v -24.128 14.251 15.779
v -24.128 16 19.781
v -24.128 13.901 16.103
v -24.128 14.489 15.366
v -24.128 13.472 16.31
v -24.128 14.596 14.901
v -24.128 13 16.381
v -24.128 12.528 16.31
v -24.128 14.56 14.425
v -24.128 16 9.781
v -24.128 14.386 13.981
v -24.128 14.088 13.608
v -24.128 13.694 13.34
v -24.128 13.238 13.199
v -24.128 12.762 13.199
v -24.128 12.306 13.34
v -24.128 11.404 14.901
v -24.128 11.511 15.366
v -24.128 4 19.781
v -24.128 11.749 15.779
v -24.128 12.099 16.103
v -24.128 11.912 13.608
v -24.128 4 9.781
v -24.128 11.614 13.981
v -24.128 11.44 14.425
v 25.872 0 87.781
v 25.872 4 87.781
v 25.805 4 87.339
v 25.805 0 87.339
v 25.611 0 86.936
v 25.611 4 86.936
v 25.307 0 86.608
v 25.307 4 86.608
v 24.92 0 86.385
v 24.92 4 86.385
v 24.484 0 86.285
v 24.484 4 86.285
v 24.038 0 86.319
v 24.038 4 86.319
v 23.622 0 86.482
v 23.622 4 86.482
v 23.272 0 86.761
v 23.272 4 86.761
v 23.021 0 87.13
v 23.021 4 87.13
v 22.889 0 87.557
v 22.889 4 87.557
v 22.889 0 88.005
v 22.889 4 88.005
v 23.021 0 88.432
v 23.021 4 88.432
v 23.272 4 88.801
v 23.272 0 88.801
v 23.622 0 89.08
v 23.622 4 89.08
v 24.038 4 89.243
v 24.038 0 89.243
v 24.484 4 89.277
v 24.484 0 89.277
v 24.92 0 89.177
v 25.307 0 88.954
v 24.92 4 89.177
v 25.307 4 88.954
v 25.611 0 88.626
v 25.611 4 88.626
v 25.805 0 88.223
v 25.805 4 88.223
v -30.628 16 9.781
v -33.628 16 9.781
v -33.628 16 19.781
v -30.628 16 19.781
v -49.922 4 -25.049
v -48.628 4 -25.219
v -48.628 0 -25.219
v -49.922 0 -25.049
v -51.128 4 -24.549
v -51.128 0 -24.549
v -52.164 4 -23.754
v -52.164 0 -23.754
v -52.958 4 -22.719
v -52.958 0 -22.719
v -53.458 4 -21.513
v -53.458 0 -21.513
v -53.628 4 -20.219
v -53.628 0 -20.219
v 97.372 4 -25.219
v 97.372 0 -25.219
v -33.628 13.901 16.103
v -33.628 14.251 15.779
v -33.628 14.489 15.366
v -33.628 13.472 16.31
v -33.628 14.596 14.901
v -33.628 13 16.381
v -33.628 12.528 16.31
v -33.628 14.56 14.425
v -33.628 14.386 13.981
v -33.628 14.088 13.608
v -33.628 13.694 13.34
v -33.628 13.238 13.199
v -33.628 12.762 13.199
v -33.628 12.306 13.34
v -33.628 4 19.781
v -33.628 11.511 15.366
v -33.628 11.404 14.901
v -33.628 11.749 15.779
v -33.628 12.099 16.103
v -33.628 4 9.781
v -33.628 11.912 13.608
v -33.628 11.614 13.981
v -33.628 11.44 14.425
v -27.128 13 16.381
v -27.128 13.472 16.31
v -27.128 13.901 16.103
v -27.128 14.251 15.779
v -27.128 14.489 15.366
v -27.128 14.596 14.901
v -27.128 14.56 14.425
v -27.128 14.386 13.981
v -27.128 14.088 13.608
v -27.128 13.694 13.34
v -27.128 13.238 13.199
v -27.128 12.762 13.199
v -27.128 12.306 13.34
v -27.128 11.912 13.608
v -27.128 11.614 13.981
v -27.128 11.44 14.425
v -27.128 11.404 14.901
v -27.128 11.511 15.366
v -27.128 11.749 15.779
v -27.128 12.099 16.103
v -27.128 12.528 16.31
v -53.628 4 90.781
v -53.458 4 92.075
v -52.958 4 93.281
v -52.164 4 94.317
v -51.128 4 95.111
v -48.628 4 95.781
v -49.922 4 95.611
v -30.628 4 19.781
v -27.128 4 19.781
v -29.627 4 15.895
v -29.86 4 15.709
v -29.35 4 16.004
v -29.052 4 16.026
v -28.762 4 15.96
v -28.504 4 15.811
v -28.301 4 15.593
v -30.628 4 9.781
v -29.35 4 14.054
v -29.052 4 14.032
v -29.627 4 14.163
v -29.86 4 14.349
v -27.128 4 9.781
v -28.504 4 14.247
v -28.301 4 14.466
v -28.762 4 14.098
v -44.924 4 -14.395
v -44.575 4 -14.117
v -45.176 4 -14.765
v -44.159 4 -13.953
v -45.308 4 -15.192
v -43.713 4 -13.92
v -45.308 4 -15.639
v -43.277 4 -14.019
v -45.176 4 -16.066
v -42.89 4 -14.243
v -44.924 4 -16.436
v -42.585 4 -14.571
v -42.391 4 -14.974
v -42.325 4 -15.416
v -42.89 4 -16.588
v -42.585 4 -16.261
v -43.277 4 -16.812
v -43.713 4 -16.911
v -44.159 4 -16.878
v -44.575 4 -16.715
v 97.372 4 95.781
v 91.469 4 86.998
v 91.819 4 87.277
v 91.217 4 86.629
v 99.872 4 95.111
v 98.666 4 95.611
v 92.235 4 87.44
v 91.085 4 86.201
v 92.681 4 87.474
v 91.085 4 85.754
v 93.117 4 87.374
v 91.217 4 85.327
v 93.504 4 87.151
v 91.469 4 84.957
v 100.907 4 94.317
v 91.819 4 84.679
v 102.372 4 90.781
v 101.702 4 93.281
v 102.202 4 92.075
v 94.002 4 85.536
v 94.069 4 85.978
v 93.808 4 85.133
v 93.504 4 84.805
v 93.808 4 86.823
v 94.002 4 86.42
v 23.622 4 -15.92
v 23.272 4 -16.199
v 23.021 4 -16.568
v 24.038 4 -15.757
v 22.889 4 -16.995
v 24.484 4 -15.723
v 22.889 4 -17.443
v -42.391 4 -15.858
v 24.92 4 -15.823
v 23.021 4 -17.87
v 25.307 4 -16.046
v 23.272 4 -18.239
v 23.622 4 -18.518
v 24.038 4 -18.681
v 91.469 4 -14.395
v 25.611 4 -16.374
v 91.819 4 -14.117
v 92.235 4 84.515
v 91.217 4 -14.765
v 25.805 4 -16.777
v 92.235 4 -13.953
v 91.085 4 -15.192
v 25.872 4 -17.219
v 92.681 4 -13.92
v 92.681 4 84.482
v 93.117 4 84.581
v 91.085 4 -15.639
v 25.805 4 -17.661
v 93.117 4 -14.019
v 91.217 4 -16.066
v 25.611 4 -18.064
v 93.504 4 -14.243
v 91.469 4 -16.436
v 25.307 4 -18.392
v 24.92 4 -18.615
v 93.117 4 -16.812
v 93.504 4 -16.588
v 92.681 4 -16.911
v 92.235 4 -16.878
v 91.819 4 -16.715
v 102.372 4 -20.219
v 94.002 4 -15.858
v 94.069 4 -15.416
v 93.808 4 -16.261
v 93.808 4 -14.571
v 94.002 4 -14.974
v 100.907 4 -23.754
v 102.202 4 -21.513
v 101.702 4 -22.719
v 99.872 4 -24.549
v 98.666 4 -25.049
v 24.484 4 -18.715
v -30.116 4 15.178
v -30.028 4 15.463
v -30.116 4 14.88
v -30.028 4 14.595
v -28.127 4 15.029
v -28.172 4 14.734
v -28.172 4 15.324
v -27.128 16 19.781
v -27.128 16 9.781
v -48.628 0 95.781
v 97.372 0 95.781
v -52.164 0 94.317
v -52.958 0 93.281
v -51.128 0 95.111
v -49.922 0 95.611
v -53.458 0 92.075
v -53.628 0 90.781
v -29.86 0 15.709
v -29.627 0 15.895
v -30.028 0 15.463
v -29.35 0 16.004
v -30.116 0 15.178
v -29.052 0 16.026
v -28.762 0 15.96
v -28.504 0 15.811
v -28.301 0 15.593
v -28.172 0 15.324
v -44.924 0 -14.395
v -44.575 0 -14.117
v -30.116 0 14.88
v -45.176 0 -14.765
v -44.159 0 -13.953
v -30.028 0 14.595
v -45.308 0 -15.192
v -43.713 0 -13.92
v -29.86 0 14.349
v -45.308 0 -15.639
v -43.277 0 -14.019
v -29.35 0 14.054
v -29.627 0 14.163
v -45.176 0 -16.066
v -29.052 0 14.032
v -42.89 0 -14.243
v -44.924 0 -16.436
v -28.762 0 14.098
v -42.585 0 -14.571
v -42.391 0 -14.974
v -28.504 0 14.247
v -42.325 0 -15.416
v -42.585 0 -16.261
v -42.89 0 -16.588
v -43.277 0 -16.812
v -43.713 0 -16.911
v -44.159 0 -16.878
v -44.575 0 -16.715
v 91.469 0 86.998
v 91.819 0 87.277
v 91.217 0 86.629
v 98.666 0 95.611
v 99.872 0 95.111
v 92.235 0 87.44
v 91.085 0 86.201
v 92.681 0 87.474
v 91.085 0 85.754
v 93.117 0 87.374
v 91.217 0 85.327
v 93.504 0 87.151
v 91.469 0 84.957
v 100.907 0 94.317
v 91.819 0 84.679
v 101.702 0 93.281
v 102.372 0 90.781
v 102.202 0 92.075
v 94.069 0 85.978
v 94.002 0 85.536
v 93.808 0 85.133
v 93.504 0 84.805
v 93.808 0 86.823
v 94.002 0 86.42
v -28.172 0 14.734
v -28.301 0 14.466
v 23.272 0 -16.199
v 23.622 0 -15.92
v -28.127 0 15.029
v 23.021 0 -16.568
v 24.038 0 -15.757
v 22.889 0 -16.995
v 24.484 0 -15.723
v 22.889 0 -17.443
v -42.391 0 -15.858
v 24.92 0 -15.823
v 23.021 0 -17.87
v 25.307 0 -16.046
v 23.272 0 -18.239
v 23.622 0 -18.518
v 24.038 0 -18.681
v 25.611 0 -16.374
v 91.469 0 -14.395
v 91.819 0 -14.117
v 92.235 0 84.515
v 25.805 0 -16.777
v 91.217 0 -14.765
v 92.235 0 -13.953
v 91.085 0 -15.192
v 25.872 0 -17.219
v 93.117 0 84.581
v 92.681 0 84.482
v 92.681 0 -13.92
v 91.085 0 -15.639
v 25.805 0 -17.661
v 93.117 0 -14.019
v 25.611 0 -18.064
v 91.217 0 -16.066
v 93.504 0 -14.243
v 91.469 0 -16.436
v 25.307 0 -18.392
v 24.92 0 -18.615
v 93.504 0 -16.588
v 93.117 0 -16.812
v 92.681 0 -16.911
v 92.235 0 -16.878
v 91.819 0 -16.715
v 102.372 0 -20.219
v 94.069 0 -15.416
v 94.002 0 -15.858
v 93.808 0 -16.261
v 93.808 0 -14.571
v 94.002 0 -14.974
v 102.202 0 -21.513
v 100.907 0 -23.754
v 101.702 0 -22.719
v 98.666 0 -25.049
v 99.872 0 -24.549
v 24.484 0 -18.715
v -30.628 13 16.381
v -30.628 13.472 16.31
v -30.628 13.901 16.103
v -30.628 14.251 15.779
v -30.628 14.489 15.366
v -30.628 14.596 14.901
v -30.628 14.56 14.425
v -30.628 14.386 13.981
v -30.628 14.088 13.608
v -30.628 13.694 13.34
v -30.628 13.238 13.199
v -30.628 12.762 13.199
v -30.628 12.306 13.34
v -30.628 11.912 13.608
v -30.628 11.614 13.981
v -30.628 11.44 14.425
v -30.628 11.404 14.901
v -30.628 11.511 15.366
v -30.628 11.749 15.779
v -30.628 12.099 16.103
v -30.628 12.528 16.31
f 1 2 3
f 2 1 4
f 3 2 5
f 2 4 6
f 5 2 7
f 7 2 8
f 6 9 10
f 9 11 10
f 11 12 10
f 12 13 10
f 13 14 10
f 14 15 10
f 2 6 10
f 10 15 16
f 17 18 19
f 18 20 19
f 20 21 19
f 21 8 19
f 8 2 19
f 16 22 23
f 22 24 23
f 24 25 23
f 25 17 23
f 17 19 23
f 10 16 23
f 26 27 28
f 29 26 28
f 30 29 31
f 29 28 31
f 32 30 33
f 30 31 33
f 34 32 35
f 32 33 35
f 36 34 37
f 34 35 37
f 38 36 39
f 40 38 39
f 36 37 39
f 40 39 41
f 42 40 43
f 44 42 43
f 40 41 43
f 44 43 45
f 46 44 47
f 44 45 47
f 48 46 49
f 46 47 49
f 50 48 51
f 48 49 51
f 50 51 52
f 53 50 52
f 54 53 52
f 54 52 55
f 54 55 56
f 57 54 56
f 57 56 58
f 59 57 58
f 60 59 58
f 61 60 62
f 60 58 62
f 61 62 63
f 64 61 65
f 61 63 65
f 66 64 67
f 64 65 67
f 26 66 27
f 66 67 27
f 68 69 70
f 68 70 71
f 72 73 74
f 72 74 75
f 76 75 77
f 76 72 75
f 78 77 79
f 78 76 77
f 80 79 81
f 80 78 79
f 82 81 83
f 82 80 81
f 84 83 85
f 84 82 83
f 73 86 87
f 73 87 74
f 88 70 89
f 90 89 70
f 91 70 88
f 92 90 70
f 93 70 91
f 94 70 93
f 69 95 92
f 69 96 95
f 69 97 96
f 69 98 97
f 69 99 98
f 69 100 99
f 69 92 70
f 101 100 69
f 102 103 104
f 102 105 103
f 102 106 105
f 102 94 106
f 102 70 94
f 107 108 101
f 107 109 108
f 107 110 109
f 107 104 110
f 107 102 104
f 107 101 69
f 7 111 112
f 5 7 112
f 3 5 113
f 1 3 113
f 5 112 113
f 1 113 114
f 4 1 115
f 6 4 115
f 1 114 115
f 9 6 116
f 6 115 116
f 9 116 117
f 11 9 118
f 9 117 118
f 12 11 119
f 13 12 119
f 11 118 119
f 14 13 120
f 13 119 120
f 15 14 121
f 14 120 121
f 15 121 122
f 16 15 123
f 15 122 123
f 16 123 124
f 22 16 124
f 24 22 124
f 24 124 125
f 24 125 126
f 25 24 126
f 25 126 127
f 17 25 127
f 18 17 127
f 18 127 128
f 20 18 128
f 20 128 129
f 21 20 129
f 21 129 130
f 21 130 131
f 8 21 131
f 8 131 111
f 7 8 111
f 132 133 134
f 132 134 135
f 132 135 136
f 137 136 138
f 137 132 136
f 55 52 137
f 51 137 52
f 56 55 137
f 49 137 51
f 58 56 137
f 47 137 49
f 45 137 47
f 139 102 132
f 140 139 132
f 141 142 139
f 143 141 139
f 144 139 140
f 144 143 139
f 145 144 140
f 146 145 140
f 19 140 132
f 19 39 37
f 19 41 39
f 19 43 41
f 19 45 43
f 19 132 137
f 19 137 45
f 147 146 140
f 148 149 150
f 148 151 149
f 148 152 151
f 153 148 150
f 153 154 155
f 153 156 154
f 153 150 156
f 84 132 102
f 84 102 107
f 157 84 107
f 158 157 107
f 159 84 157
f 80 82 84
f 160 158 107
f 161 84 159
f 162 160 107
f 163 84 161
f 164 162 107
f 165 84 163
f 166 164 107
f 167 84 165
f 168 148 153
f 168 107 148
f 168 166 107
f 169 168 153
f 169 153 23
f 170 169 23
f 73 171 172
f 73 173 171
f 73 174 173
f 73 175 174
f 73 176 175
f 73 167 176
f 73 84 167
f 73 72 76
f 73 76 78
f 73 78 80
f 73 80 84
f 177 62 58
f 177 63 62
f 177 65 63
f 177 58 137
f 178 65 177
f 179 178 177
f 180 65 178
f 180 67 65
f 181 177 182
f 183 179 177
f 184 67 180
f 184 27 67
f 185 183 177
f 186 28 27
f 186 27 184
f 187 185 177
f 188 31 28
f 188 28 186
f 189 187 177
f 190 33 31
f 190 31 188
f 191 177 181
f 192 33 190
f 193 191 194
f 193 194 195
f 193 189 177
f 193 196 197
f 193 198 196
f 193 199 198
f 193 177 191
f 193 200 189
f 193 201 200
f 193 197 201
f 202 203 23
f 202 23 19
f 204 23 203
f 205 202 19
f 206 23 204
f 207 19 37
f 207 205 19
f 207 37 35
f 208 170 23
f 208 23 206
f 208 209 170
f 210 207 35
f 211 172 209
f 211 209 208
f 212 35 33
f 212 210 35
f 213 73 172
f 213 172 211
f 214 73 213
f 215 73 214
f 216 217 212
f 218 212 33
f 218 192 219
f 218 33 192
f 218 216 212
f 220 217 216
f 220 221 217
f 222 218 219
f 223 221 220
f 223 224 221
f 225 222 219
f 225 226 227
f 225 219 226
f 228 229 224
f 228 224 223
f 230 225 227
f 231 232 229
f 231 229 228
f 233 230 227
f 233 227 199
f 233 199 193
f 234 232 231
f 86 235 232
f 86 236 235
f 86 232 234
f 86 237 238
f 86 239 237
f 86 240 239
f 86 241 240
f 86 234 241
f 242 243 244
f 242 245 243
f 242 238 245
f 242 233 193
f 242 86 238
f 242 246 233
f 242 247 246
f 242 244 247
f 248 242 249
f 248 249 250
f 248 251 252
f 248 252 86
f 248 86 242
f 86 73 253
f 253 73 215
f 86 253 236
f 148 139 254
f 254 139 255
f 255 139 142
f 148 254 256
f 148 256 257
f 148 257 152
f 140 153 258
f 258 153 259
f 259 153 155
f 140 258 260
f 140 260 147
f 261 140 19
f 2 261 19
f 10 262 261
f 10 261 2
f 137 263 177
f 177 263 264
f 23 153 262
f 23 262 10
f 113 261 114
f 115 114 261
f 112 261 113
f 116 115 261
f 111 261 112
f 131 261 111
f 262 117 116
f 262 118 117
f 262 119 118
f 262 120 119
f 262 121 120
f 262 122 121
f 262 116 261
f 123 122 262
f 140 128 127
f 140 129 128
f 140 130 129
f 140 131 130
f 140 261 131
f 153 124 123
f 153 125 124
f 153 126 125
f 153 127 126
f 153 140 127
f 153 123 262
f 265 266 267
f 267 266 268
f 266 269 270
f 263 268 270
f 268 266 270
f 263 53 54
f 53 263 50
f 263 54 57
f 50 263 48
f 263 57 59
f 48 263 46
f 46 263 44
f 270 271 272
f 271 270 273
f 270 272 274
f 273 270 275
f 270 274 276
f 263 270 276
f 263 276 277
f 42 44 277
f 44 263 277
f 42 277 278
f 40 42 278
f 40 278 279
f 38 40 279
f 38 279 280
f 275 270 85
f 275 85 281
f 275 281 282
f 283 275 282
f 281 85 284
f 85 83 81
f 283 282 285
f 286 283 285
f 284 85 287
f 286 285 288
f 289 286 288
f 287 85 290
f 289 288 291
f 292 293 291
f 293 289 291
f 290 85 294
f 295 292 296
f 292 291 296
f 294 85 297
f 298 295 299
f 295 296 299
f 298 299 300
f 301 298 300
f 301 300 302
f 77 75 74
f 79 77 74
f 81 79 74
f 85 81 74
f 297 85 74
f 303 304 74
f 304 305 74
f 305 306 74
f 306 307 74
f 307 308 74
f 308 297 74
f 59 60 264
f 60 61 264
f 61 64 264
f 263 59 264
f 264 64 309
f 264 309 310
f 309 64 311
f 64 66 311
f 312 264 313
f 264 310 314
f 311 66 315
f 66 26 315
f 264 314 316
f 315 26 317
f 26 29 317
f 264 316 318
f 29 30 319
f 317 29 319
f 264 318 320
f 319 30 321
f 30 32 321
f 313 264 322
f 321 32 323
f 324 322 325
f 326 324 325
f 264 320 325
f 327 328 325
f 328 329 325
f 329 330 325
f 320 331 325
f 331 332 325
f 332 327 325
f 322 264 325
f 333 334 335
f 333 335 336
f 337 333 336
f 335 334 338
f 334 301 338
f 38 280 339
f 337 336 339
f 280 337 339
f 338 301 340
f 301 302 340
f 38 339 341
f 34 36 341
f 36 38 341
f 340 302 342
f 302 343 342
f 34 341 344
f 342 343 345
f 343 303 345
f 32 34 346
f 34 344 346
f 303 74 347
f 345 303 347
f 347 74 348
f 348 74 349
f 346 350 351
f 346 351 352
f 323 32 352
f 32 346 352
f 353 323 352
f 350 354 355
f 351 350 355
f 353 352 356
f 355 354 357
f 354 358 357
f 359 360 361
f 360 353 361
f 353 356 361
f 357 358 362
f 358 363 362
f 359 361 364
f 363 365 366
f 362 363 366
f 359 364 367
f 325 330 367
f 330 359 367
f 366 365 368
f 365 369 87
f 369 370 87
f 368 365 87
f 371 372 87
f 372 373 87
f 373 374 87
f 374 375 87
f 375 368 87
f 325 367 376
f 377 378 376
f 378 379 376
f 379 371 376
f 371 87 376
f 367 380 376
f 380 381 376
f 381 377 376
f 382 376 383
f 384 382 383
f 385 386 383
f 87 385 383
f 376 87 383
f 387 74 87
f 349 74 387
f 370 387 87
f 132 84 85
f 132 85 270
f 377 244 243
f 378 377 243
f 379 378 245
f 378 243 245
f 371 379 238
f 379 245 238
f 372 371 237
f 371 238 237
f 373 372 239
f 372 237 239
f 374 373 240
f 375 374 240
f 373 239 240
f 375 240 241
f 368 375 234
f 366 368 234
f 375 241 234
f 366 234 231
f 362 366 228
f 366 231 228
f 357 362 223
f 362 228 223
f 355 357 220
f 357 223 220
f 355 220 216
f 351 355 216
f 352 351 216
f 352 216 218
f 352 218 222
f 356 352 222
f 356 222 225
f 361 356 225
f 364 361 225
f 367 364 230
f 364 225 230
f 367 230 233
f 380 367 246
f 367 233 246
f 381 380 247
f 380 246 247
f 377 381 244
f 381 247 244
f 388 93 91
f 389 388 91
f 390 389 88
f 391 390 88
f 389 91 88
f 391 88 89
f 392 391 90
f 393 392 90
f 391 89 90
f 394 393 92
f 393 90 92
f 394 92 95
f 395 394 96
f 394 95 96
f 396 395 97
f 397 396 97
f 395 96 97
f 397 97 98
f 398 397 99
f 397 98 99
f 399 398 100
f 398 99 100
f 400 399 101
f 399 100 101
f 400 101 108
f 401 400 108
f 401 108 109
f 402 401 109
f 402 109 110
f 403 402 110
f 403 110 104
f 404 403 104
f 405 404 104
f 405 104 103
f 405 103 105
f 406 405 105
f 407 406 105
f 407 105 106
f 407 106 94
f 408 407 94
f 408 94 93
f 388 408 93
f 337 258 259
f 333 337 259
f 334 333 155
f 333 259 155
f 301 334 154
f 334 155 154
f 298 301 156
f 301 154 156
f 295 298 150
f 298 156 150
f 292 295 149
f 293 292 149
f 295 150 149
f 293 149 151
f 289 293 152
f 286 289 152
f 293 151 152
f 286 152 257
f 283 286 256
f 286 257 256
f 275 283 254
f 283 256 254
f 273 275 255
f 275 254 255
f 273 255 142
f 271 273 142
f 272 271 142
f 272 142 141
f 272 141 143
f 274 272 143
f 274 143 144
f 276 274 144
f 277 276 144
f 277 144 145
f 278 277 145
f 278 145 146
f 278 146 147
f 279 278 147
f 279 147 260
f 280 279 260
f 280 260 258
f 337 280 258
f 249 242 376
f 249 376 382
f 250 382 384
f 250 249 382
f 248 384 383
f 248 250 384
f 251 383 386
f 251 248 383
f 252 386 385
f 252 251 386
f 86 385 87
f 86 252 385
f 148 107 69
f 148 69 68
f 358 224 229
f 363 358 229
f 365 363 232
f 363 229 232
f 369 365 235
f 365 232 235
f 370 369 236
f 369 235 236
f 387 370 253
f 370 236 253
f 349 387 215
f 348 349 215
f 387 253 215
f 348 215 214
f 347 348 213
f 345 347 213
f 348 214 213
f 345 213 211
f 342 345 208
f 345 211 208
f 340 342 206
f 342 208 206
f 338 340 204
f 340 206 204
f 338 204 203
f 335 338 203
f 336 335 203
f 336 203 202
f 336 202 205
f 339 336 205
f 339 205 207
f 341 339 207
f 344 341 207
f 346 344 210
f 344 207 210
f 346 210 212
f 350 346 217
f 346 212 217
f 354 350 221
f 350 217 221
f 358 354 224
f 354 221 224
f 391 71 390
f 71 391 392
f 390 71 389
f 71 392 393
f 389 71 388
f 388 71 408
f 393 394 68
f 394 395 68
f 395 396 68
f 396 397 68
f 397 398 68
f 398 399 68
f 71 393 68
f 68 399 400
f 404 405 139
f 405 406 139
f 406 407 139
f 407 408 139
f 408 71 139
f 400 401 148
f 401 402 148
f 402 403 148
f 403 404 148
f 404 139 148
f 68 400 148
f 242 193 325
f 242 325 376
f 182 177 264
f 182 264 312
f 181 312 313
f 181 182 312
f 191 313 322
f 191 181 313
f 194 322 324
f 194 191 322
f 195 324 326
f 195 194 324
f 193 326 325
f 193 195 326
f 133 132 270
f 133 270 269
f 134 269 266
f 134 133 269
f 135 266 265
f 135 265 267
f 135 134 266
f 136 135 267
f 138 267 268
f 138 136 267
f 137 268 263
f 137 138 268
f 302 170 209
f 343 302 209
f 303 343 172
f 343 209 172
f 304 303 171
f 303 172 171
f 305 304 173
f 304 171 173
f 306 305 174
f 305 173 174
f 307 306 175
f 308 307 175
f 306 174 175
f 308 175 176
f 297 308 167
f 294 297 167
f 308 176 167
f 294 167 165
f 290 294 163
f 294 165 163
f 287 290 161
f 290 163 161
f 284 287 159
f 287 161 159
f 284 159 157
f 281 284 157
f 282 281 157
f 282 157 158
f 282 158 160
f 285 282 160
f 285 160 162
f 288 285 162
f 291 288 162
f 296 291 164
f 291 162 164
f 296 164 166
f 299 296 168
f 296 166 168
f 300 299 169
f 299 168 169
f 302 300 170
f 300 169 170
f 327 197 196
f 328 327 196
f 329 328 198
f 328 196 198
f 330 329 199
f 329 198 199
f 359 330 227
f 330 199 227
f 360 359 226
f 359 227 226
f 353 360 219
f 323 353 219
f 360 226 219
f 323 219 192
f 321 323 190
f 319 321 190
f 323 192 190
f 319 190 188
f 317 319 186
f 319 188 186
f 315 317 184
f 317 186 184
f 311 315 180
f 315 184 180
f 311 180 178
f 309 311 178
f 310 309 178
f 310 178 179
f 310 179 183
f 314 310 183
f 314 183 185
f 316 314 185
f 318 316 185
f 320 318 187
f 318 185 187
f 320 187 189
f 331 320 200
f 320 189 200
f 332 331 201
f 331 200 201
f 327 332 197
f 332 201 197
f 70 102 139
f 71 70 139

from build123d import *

# Parameters (mm, degrees)
SKETCH1_W           = 248.69467868
SKETCH1_H           = 191.562117362
BOSS_EXTRUDE1_DEPTH = 4
CUT_EXTRUDE1_DEPTH  = 10
SKETCH3_R           = 1.5
CUT_EXTRUDE2_DEPTH  = 4
SKETCH10_W          = 3
SKETCH10_H          = 10
BOSS_EXTRUDE2_DEPTH = 12
SKETCH12_R          = 1.6
CUT_EXTRUDE3_DEPTH  = 10
SKETCH13_R          = 1
CUT_EXTRUDE4_DEPTH  = 6


with BuildPart() as part:
    # Sketch1 → Boss-Extrude1 (new body)
    with BuildSketch(Plane(origin=(0, 0, 0), x_dir=(1, 0, 0), z_dir=(0, 1, 0))):
        Rectangle(SKETCH1_W, SKETCH1_H)
    extrude(amount=BOSS_EXTRUDE1_DEPTH)

    # Sketch2 → Cut-Extrude1 (cut)
    with BuildSketch(Plane(origin=(0, 4, 0), x_dir=(1, 0, 0), z_dir=(0, 1, 0))):
        with BuildLine():
            Line((-53.628035699, 20.218941319), (-53.628035699, -90.781058681))
            ThreePointArc((-53.628035699, -90.781058681), (-52.163569604, -94.316592587), (-48.628035699, -95.781058681))
            Line((-48.628035699, -95.781058681), (-124.34733934, -95.781058681))
            Line((-124.34733934, -95.781058681), (-124.34733934, 95.781058681))
            Line((-124.34733934, 95.781058681), (124.34733934, 95.781058681))
            Line((124.34733934, 95.781058681), (124.34733934, -95.781058681))
            Line((124.34733934, -95.781058681), (97.371964301, -95.781058681))
            ThreePointArc((97.371964301, -95.781058681), (100.907498207, -94.316592587), (102.371964301, -90.781058681))
            Line((102.371964301, -90.781058681), (102.371964301, 20.218941319))
            ThreePointArc((102.371964301, 20.218941319), (100.907498207, 23.754475225), (97.371964301, 25.218941319))
            Line((97.371964301, 25.218941319), (-48.628035699, 25.218941319))
            ThreePointArc((-48.628035699, 25.218941319), (-52.163569604, 23.754475225), (-53.628035699, 20.218941319))
        make_face()
    extrude(amount=-CUT_EXTRUDE1_DEPTH, mode=Mode.SUBTRACT)

    # Sketch3 → Cut-Extrude2 (cut)
    with BuildSketch(Plane(origin=(0, 4, 0), x_dir=(1, 0, 0), z_dir=(0, 1, 0))):
        with Locations((-43.82473484, 15.41564046)):
            Circle(SKETCH3_R)
        with Locations((24.371964301, 17.218941319)):
            Circle(SKETCH3_R)
        with Locations((92.568663443, 15.41564046)):
            Circle(SKETCH3_R)
        with Locations((24.371964301, -87.781058681)):
            Circle(SKETCH3_R)
        with Locations((92.568663443, -85.977757822)):
            Circle(SKETCH3_R)
    extrude(amount=-CUT_EXTRUDE2_DEPTH, mode=Mode.SUBTRACT)

    # Sketch10 → Boss-Extrude2 (add)
    with BuildSketch(Plane(origin=(0, 4, 0), x_dir=(1, 0, 0), z_dir=(0, 1, 0))):
        with Locations((-32.128035699, -14.781058681)):
            Rectangle(SKETCH10_W, SKETCH10_H)
        with Locations((-25.628035699, -14.781058681)):
            Rectangle(SKETCH10_W, SKETCH10_H)
    extrude(amount=BOSS_EXTRUDE2_DEPTH)

    # Sketch12 → Cut-Extrude3 (cut)
    with BuildSketch(Plane.ZY.offset(33.628035699)):
        with Locations((14.781058681, 13)):
            Circle(SKETCH12_R)
    extrude(amount=-CUT_EXTRUDE3_DEPTH, mode=Mode.SUBTRACT)

    # Sketch13 → Cut-Extrude4 (cut)
    with BuildSketch(Plane(origin=(0, 4, 0), x_dir=(1, 0, 0), z_dir=(0, 1, 0))):
        with Locations((-29.127206005, -15.029218682)):
            Circle(SKETCH13_R)
    extrude(amount=-CUT_EXTRUDE4_DEPTH, mode=Mode.SUBTRACT)


solid = part.part
